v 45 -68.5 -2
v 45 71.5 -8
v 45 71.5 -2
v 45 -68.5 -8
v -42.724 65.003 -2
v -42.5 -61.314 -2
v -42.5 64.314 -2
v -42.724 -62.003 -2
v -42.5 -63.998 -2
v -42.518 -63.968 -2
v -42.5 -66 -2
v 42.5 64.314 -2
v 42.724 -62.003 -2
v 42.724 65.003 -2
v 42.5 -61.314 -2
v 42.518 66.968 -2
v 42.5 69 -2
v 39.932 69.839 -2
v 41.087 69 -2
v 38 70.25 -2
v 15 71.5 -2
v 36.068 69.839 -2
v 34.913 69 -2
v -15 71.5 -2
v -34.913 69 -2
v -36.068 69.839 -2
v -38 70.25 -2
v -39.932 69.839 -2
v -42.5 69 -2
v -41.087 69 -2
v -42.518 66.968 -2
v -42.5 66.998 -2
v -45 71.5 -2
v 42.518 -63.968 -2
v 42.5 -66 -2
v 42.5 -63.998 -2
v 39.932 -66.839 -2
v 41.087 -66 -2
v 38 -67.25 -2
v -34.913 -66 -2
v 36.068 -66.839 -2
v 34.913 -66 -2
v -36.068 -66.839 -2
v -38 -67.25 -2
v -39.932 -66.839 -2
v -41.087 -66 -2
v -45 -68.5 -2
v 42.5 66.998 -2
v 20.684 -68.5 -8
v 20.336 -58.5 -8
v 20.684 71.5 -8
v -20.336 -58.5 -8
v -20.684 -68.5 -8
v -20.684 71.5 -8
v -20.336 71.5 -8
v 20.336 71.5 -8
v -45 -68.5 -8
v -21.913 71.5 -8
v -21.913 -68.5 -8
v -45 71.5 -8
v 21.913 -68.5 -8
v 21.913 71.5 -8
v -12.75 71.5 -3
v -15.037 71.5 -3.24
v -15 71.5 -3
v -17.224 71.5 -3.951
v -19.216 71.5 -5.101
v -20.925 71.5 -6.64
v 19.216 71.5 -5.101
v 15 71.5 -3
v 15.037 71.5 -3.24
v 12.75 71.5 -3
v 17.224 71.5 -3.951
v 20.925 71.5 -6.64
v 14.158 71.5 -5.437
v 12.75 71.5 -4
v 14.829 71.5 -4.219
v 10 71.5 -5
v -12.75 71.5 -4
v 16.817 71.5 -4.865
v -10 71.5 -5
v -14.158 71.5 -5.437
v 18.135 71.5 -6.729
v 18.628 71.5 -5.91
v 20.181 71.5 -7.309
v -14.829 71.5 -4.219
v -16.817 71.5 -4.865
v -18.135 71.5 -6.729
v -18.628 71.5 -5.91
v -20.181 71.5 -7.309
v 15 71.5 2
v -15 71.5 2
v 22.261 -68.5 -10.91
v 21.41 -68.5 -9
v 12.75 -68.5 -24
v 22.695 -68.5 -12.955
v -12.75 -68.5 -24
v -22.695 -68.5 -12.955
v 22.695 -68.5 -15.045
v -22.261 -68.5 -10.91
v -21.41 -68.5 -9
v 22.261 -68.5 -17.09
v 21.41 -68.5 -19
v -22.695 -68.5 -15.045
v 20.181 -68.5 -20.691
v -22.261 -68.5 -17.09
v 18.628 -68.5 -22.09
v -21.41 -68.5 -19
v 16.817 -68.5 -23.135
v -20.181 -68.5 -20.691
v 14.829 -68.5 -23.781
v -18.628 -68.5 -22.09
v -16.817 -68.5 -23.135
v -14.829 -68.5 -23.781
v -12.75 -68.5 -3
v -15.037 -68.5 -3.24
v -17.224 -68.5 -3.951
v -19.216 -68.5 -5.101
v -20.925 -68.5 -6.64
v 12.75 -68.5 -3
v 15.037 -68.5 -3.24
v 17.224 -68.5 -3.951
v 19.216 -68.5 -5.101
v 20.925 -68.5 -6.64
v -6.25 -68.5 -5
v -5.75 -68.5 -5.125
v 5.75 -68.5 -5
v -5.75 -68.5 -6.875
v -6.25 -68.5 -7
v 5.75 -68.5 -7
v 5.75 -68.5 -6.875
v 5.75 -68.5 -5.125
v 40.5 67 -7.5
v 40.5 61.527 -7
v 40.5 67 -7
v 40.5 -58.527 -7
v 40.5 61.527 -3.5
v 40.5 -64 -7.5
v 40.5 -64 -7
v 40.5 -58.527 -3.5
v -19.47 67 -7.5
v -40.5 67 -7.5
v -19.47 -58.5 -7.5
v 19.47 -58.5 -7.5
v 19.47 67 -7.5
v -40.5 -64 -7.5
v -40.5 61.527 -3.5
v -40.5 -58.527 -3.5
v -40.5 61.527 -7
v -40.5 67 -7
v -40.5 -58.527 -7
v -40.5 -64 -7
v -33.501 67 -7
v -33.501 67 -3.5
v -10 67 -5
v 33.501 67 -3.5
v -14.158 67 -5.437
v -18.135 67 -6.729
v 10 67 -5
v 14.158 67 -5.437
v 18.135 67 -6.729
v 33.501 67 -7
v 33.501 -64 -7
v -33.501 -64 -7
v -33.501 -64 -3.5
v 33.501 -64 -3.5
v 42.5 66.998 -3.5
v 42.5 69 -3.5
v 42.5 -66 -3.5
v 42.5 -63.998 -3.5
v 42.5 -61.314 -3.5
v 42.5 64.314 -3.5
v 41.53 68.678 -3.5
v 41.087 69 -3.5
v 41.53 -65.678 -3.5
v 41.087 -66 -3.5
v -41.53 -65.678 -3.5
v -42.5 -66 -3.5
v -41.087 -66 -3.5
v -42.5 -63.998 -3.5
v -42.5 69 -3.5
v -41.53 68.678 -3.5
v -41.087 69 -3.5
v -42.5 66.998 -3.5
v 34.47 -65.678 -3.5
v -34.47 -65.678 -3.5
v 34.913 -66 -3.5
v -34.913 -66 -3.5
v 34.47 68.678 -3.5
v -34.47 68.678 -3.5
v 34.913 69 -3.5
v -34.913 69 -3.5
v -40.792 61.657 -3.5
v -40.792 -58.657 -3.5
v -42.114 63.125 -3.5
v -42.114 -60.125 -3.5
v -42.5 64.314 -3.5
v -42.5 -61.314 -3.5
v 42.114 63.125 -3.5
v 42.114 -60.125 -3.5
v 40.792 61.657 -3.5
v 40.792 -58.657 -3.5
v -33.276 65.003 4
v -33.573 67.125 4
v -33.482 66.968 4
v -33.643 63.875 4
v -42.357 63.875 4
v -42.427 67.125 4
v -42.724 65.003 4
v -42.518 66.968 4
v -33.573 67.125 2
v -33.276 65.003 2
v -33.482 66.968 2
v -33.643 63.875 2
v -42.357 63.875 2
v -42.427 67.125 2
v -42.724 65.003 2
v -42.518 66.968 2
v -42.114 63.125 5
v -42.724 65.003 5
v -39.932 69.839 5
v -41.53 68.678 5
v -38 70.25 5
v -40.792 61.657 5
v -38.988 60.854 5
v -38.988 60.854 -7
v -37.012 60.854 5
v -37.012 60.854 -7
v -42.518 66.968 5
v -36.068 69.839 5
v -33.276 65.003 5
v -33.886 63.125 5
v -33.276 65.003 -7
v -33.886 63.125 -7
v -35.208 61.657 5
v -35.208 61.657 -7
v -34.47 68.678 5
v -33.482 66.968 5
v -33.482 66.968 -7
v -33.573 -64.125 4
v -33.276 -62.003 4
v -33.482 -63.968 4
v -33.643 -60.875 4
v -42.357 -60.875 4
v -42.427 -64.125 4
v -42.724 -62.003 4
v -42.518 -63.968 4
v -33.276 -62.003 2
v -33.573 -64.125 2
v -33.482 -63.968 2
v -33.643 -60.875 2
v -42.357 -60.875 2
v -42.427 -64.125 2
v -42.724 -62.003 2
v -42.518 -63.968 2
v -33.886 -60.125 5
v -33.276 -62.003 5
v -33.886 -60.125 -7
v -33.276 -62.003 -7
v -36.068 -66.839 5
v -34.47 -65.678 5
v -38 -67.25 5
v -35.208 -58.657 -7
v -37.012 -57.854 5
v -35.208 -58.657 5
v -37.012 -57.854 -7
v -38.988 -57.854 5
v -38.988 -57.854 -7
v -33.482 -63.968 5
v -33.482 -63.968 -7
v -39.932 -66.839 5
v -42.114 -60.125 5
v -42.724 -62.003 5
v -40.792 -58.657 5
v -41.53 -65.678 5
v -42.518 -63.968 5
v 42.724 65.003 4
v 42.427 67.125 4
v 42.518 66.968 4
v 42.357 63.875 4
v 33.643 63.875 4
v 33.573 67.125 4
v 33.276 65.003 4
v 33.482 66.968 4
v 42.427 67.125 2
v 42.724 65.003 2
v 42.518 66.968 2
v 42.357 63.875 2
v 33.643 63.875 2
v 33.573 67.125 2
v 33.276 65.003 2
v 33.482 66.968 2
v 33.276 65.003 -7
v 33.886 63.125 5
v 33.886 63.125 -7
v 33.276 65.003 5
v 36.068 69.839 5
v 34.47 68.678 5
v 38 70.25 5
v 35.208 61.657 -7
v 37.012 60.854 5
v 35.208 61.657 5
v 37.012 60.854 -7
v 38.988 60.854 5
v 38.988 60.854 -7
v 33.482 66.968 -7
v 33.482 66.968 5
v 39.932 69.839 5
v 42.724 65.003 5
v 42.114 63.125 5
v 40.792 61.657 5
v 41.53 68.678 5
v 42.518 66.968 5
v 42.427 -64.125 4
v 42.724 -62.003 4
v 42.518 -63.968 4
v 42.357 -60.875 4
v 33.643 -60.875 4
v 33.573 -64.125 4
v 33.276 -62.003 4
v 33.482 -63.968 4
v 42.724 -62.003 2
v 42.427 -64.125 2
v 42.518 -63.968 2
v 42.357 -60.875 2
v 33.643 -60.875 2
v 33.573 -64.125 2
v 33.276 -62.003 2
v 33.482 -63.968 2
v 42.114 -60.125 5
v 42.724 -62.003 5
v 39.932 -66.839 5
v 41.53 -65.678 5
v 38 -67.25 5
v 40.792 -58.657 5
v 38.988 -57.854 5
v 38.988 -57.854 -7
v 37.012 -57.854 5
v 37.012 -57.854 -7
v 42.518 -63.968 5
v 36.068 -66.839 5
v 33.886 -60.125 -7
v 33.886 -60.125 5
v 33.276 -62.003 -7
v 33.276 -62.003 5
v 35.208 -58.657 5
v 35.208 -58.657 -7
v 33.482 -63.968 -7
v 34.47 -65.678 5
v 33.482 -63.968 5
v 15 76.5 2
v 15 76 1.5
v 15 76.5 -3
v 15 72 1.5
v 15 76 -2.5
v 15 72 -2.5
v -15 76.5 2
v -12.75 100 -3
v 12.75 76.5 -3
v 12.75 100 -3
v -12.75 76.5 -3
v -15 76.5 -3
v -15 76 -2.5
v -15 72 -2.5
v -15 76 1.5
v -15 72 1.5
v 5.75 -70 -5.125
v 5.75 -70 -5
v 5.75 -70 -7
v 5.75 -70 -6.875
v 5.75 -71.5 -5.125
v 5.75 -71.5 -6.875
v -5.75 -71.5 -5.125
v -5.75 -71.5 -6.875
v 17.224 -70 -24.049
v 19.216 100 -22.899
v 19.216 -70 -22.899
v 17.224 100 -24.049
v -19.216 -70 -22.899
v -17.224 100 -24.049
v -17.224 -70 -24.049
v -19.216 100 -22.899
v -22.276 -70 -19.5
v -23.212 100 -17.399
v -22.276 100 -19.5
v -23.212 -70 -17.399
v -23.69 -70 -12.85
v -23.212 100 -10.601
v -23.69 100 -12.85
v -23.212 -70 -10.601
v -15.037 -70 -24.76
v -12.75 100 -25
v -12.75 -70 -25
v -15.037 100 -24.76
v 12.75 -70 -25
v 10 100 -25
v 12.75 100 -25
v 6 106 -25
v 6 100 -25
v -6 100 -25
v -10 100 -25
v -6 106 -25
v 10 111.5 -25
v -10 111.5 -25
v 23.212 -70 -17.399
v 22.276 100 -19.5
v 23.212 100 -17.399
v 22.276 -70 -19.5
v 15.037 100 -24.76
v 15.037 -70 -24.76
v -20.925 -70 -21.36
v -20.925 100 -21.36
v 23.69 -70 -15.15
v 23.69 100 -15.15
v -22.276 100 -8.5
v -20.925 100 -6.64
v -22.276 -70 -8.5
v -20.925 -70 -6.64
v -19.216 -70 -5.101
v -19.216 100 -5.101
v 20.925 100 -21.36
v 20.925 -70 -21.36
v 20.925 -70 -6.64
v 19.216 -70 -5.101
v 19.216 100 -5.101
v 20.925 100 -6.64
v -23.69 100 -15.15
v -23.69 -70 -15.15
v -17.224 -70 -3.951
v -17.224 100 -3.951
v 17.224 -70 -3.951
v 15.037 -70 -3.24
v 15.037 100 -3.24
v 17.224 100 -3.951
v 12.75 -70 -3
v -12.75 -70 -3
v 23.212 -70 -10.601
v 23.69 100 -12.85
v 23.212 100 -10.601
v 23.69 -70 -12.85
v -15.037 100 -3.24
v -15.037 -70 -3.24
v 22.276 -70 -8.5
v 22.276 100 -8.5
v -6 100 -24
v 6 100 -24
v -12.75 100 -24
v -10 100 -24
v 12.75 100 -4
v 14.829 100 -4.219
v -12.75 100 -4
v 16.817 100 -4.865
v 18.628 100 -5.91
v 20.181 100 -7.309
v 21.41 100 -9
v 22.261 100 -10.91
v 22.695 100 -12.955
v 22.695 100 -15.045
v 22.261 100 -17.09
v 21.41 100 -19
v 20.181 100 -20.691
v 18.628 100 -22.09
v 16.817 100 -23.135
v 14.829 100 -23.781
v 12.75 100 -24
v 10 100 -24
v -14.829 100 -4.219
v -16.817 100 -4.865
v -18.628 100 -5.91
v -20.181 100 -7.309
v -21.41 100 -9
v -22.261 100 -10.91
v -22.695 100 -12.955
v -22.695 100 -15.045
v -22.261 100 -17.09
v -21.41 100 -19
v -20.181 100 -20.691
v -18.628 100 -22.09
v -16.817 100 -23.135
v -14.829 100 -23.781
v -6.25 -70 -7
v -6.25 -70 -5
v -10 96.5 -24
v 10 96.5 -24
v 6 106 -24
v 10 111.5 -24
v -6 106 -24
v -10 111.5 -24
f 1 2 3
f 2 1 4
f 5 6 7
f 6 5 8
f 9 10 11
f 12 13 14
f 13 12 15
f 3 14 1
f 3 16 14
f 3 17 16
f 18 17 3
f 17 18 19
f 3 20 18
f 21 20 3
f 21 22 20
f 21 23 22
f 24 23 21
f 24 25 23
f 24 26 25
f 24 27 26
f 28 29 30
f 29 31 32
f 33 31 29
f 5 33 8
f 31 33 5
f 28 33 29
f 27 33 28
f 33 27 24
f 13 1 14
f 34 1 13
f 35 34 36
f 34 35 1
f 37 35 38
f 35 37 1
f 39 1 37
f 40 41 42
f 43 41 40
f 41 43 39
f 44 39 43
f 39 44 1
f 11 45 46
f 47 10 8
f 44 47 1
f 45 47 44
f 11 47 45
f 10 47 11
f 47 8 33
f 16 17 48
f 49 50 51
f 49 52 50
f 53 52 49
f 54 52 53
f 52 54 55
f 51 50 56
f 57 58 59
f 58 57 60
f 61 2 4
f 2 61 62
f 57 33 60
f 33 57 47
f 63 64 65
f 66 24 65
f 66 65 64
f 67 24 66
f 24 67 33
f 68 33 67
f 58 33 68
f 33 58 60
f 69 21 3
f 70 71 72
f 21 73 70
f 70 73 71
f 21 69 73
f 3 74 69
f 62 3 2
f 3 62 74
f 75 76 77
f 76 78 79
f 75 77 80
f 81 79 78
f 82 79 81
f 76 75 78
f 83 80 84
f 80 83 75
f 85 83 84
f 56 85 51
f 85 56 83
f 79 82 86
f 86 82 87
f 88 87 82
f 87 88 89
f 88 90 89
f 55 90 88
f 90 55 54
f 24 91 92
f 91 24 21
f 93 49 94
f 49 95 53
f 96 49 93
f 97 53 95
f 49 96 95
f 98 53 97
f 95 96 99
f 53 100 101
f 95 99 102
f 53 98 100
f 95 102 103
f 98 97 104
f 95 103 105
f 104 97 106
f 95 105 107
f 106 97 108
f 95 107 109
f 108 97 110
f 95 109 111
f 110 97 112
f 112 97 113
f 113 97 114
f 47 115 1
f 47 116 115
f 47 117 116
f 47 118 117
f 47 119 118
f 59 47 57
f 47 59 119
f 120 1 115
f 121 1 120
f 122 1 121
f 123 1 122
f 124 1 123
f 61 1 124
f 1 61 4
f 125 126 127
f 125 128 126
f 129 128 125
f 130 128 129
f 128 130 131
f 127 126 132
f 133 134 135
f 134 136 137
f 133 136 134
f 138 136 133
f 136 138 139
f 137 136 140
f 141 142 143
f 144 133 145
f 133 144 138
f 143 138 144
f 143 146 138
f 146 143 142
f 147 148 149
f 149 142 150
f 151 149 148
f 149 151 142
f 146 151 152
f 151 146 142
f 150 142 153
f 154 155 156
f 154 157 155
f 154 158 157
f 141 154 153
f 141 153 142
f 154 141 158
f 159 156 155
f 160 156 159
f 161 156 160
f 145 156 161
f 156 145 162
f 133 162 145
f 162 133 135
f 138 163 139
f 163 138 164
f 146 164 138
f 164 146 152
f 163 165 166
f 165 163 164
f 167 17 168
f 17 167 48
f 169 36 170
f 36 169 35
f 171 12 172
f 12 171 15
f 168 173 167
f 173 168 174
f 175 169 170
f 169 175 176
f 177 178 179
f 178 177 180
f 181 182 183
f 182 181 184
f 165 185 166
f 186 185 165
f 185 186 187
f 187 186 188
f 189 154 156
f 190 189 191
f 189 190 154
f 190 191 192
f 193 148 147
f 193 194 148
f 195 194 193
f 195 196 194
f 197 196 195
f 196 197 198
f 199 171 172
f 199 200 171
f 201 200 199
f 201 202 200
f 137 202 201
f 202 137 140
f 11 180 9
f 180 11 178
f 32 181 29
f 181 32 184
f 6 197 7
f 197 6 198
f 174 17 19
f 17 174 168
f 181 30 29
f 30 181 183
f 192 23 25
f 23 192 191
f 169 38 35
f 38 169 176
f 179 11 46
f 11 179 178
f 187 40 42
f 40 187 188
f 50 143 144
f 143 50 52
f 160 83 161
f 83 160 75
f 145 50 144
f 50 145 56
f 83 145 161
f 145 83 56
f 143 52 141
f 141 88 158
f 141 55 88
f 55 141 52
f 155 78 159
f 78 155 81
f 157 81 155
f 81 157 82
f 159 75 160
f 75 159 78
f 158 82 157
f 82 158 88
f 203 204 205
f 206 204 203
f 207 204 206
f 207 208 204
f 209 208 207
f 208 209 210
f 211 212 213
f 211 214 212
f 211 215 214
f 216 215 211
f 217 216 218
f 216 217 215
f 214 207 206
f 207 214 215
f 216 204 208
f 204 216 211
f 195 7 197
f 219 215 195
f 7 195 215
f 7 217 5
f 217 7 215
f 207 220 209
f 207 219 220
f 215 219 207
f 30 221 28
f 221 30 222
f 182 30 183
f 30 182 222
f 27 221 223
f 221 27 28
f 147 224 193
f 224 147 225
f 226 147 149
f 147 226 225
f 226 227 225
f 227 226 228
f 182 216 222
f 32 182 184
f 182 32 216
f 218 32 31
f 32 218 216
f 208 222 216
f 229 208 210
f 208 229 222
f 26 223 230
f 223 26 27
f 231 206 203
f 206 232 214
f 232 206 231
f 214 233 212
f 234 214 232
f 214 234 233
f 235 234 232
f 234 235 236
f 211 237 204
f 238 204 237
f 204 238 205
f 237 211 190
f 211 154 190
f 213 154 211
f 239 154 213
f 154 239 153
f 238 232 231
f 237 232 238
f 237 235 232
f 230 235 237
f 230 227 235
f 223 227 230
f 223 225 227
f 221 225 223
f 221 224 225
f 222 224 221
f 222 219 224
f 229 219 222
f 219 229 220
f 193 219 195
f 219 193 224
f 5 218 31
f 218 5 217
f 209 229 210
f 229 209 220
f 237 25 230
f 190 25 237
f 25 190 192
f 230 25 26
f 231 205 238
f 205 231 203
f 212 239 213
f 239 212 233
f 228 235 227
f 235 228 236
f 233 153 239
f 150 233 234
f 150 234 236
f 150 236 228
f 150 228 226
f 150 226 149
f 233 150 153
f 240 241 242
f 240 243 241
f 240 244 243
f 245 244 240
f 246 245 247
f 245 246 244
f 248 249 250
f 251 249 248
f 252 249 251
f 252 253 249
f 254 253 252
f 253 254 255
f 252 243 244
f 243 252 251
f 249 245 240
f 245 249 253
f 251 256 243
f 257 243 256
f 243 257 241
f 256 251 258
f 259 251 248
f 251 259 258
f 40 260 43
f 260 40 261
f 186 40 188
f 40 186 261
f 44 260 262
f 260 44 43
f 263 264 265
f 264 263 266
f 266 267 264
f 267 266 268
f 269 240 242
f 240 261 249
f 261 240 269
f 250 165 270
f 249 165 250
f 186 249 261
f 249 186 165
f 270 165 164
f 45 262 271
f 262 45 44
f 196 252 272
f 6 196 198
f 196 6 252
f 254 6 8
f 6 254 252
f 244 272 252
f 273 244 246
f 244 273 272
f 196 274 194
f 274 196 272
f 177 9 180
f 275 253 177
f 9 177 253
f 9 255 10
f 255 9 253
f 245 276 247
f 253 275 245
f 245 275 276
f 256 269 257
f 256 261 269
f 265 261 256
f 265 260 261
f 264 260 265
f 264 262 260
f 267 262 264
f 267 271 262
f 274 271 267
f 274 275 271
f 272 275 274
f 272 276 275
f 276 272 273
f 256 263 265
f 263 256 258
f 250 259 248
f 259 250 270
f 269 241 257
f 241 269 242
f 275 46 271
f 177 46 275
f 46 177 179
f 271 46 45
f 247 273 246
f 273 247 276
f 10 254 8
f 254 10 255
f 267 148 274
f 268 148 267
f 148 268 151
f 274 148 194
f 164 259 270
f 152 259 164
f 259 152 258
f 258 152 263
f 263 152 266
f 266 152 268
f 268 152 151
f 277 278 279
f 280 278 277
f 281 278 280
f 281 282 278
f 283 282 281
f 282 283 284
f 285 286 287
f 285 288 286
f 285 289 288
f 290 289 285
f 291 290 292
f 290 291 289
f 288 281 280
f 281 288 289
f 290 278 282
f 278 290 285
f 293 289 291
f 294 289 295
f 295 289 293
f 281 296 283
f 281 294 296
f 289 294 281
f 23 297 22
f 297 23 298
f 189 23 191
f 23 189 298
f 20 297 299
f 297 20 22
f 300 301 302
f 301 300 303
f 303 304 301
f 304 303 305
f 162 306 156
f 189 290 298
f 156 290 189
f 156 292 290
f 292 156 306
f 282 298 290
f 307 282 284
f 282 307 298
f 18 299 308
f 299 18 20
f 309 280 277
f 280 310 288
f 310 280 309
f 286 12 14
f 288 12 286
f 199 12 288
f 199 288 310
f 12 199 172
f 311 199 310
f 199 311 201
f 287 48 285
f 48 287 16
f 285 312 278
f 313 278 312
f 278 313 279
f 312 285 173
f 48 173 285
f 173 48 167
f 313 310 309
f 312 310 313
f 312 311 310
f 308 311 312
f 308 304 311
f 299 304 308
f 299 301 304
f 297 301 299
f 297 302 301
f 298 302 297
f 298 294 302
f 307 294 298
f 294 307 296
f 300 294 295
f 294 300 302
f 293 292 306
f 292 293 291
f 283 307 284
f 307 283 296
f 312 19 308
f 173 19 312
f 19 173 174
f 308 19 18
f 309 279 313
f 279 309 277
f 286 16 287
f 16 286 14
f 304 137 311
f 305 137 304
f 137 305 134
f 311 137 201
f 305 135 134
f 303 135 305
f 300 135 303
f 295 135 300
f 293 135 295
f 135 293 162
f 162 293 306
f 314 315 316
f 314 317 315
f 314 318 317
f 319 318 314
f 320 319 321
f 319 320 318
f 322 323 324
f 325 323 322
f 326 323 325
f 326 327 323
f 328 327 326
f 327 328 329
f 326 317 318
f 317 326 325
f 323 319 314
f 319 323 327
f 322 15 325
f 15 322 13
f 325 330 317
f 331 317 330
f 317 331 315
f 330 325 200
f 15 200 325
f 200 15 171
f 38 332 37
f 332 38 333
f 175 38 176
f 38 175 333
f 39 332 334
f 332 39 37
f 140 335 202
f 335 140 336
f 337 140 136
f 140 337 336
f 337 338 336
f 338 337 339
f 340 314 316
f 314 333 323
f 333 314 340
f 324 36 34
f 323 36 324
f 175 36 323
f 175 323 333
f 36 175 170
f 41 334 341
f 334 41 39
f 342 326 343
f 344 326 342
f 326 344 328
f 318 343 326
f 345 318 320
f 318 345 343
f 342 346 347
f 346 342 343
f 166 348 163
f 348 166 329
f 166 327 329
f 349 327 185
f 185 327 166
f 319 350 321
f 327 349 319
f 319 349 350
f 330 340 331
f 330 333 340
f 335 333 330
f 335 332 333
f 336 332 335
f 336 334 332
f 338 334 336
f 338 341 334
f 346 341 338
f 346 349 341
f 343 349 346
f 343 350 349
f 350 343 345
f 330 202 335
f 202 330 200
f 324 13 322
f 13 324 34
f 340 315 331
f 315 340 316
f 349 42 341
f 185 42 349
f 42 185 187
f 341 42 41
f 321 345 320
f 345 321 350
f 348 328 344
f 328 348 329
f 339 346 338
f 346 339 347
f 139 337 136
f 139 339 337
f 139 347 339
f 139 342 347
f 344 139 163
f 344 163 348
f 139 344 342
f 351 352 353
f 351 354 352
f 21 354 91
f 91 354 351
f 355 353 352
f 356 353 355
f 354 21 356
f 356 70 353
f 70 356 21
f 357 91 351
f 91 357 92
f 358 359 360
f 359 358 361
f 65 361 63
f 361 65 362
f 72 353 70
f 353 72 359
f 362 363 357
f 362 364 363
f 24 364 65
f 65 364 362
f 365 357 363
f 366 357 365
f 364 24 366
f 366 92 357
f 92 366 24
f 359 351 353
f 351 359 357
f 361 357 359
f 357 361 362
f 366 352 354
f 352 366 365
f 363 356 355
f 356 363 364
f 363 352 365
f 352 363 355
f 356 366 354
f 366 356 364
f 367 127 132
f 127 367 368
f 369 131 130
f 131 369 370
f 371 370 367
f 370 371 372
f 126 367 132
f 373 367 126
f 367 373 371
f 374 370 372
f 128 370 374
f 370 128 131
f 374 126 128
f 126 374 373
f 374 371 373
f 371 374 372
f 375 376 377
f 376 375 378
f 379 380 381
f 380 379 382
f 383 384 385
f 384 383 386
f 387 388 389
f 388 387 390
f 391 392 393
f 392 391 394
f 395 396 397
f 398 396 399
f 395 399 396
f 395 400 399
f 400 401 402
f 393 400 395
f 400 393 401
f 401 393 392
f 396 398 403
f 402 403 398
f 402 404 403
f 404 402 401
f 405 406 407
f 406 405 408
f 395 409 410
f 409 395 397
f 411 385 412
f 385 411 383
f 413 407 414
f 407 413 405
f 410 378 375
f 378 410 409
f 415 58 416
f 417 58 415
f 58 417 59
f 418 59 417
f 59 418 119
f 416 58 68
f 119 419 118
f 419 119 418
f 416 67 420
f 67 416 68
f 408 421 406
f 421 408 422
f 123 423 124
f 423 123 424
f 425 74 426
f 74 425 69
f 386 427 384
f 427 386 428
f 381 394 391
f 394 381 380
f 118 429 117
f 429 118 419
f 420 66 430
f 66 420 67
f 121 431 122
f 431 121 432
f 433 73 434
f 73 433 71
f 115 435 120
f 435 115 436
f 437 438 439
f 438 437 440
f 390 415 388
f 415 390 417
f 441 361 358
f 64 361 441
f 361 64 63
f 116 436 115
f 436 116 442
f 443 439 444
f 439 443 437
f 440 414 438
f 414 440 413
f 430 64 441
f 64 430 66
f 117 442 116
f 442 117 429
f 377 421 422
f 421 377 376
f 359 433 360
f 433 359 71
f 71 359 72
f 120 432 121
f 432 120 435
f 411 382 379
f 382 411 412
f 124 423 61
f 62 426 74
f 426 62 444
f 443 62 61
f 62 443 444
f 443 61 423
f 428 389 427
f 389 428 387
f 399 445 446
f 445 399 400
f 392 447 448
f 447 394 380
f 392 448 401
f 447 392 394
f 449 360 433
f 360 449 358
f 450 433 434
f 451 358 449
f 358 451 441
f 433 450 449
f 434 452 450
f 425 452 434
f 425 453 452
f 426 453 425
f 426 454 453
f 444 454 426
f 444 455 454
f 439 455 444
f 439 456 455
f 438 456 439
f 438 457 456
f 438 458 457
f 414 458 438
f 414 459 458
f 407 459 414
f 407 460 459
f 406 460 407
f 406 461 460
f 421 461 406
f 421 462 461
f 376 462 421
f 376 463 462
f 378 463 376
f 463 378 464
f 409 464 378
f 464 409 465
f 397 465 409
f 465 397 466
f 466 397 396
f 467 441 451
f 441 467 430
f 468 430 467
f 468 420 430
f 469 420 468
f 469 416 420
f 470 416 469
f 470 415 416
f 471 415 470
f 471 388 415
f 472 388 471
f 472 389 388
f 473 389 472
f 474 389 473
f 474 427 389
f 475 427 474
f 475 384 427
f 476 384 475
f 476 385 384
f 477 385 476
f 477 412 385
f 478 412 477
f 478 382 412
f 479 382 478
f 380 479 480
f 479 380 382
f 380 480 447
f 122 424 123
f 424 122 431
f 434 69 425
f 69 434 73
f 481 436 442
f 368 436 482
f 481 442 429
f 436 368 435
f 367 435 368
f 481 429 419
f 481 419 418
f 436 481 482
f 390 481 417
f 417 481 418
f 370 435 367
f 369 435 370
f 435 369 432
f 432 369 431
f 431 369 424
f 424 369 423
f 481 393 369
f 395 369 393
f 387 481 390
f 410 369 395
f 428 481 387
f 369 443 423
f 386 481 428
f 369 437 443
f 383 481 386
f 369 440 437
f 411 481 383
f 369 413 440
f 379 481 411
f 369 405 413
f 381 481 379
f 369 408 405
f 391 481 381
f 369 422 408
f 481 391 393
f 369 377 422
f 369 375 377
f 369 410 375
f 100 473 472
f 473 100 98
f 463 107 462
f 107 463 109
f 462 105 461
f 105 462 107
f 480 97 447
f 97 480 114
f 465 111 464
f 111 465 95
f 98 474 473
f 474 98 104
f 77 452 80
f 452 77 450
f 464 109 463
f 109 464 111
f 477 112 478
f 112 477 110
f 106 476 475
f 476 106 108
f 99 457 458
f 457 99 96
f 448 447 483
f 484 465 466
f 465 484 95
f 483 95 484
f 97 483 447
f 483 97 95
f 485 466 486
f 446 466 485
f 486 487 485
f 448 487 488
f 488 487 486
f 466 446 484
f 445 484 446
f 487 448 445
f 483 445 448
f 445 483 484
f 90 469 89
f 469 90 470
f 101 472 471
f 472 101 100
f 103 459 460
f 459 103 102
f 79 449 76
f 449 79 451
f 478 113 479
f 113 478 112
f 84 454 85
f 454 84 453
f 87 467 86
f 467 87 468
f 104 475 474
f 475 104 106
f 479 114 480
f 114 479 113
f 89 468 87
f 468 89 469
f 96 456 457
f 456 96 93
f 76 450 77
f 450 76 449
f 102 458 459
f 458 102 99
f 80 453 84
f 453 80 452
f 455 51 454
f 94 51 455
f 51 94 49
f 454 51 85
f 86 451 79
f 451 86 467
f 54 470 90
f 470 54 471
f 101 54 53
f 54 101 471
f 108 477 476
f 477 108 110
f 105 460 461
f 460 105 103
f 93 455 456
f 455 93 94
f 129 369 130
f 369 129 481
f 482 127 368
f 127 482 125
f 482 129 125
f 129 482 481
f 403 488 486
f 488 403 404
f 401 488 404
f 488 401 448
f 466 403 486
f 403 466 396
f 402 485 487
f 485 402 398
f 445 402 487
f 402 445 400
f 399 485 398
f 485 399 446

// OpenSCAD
// file: scad-parts/filter-side-clamps.scad
/////////////////////////////////////////////////////////////////////////////////
// This module is for generating the side holder clips for the filter holders. //
// The clips will help form a better seal around the filters.                  //
/////////////////////////////////////////////////////////////////////////////////

module filter_side_clamps(){
    difference() {
        translate([0,0,-4])
        cube([18,5,13],center=true);
        translate([0,1,-4.5])
        cube([30,4,9],center=true);
        translate([0,0,-4])
        cube([30,3,10],center=true);
    }
}

filter_side_clamps();
// file: scad-parts/front-plug.scad
$fn=360;

module front_face_plug() {
    difference(){
        cylinder(h=3, r=20, center=true);
        translate([0,0,1])
        cylinder(h=3, r=19.5, center=true);
    }

    translate([0,0,5])
    cylinder(h=10, r=1, center=true);

    translate([0,0,10.5])
    cylinder(h=2, r1=1.5, r2=0, center=true);
}

front_face_plug();
// file: scad-parts/universal-filter-holder-top.scad
/////////////////////////////////////////////////////////////////
// This module is used for maintaining the PM2.5 Filter holder.//
/////////////////////////////////////////////////////////////////

// This imports the peg hole's to make the cutouts in the filter holder.
use <connector-pegs.scad>

module universal_filter_holder(filter_holder_x, filter_holder_y, filter_holder_z, filter_hole_height,filter_hole_radius, filter_hole_length, peg_space, peg_y_position, number_of_pegs, peg_height, peg_radius,connector_clip_x, connector_clip_y, connector_clip_z) {
    
    difference() {
        
        // This section is for creating the base rectangle for the filter holder.
        union() {
            // This section is for creating the YELLOW rectangle pieces of the filter holder.
            color("yellow")
            cube([filter_holder_x, filter_holder_y, filter_holder_z], center=true);
            
            // This section is for creating the RED rectangle pieces of the filter holder.
            translate([0,0,-1])
            color("red")
            cube([90-5.25, 124.5, filter_holder_z], center=true);
            
        }
    

        //This Section is for maintaining the large PINK center cutout for the air to pass through.
        translate([0, -filter_hole_length/2, 0])
        color("pink")
        hull() {
            translate([0, filter_hole_length, 0]) 
            cylinder(h = filter_hole_height, r1 = filter_hole_radius, r2 = filter_hole_radius, center = true);
            
            translate([0,0,-1])
            cylinder(h = filter_hole_height, r1 = filter_hole_radius, r2 = filter_hole_radius, center = true);
        }
        
        // This section is for making the PURPLE gap for holding the filter.
         translate([0,0,1])
         color("purple")
         cube([filter_holder_x-5, filter_holder_y-15, filter_holder_z+1], center=true);
    
        // This section is for cutting out the BLUE peg holes. Color defined in connector_pegs.scad file.
        // use <connector-pegs.scad>
        rotate([0,0,90])
        translate([0,peg_y_position,0])
        holder_pegs(peg_space, number_of_pegs, peg_height, peg_radius, connector_clip_x, connector_clip_y, connector_clip_z);

        rotate([0,0,90])
        translate([0,-peg_y_position,0])
    holder_pegs(peg_space, number_of_pegs, peg_height, peg_radius, connector_clip_x, connector_clip_y, connector_clip_z);
        
        }
    // The following 3 section create crossbar holders for the filters to secure them.    
    translate([0, -filter_hole_length/2, -1.75])  
    cube([filter_holder_x-5.25, 4, 1.5], center=true);
        
    translate([0, filter_hole_length/2, -1.75])  
    cube([filter_holder_x-5.25, 4, 1.5], center=true);
             
    translate([0, 0, -1.75])  
    cube([4, filter_holder_y-15.5, 1.5], center=true);

}

// Bottom Layer top
universal_filter_holder(filter_holder_x=90,
              filter_holder_y=140,
              filter_holder_z=3,
              filter_hole_height = 6,
              filter_hole_radius = 34,
              filter_hole_length = 48,
              peg_y_position=38,
              peg_space=64,
              number_of_pegs=2,
              peg_height=10,
              peg_radius=5,
              connector_clip_x=10,
              connector_clip_y=3,
              connector_clip_z=2);
// file: scad-parts/connector-blocks.scad
//////////////////////////////////////////////////////////////////////////////////////////////
// This module is used for connecting the snorkel to the filter.//
//////////////////////////////////////////////////////////////////////////////////////////////

// Generates two BLUEoutside blocks for the plug to connect through.
module connector_block_cutout(ccube_x, ccube_y, ccube_z){
    color("blue")
    difference() {
        cube([ccube_x, ccube_y, ccube_z],center=true);
        cube([ccube_x+2, ccube_y-1, ccube_z-1],center=true);
    }
}

// Generates RED inside block for the plug to connect through.
module connector_block_outsides(ccube_x, ccube_y, ccube_z){
    color("red")
    difference() {
        connector_block_cutout(ccube_x, ccube_y, ccube_z);
        cube([ccube_x-15, ccube_y+2, ccube_z+2],center=true);
    }
}

// Generates the white plug to hold the parts together.
module connector_block_peg(ccube_x, ccube_y, ccube_z){
    color("white")
    difference() {
        cube([ccube_x+2, ccube_y, ccube_z],center=true);
        translate([-1, 0, 0])
        connector_block_cutout(ccube_x+.25, ccube_y+.25, ccube_z+.25);
    }
}

// Generates two BLUEoutside blocks for the plug to connect through.
connector_block_outsides(ccube_x=30, ccube_y=5, ccube_z=5);

// Generates RED inside block for the plug to connect through.
connector_block_cutout(ccube_x=15, ccube_y=5, ccube_z=5);

// Generates the white plug to hold the parts together.
//connector_block_peg(ccube_x=30, ccube_y=5, ccube_z=5);
// file: scad-parts/connector-pegs.scad
//////////////////////////////////////////////////////////////////
// This module is used for generating the peg cutouts and pegs. //
//////////////////////////////////////////////////////////////////

// peg_space: This controls the X-axis space between the pegs.
// number_of_pegs: This defines the number of pegs to generate.
// peg_height: This defines the Z-axis height of the peg.
// peg_radius: This determines the diameter/circumferance of each peg.
// peg_y_position: This determines the Y-axis position of the pegs.

// This generates the GREEN peg clip.
module peg_connector_clip(connector_clip_x, connector_clip_y, connector_clip_z) {
    color("green")
    cube([connector_clip_x, connector_clip_y, connector_clip_z],true);
    translate([connector_clip_y+2,0,.25])
    cube([2,5,2.5],true);
}

// This generates the WHITE hole size in the Blue peg so the GREEN clip can slide in.
module peg_connector_hole(connector_clip_x, connector_clip_y, connector_clip_z) {
    color("white")
    peg_connector_clip(connector_clip_x+.25, connector_clip_y+.25, connector_clip_z);
}

// This module combines and diffs the WHITE hole from the BLUE peg.
module peg(peg_height, peg_radius, connector_clip_x, connector_clip_y, connector_clip_z) {
    difference() {
        // This generates the BLUE peg.
        color("blue")
        cylinder(h = peg_height, r1 = peg_radius, r2 = peg_radius, center = true);
        
        // This is the WHITE peg Hole.
        rotate([0,0,90])
        translate([2, 0, +4])
        peg_connector_hole(connector_clip_x, connector_clip_y, connector_clip_z);
    }
}

// This module generates "number_of_pegs" at "pegs_space" in millimeters apart.
module holder_pegs(peg_space, number_of_pegs, peg_height, peg_radius, connector_clip_x, connector_clip_y, connector_clip_z) {
    for (i=[0: 360/number_of_pegs: 360])
        rotate([0,0,i])
        translate([peg_space,0,0])
        peg(peg_height, peg_radius, connector_clip_x, connector_clip_y, connector_clip_z);
}


peg_y_position=20;

translate([0,peg_y_position,0])
holder_pegs(peg_space=60,
            number_of_pegs=2,
            peg_height=12,
            peg_radius=5,
            connector_clip_x=13,
            connector_clip_y=3,
            connector_clip_z=2);

//translate([0,-peg_y_position,0])
//holder_pegs(peg_space=60,
//            number_of_pegs=2,
//            peg_height=12,
//            peg_radius=5,
//            connector_clip_x=10,
//            connector_clip_y=3,
//            connector_clip_z=2);

//peg_connector_clip(connector_clip_x=10,
//                   connector_clip_y=3,
//                   connector_clip_z=2);
// file: scad-parts/filter-holder-bottom.scad
/////////////////////////////////////////////////////////////////////////////////////////
// This module is used for creating the box for the snorkel tube and filter to connect.//
/////////////////////////////////////////////////////////////////////////////////////////

// This imports the peg hole's to make the cutouts in the filter holder.
use <connector-pegs.scad>
// This imports the peg hole's to make the cutouts in the filter holder.
use <snorkel-tube-attachment.scad>
// This imports the connector blocks, designed to connect the snorkel to the filter bottom.
use <connector-blocks.scad>

//Bottom half of the air filter holder.
module filter_holder_bottom(filter_holder_top_x, filter_holder_top_y, filter_holder_top_z, snorkel_tube_height, snorkel_tube_radius, snorkel_diameter, peg_space, number_of_pegs, peg_height, peg_radius, peg_y_position, connector_clip_x, connector_clip_y, connector_clip_z) {
    
    
    difference() {
        // This is the YELLOW base plate that everything is carving out of.
        color("yellow")
        cube([filter_holder_top_x, filter_holder_top_y, filter_holder_top_z], center=true);
        
        // This is the initial ORANGE area carved out of the inside of the YELLOW section.
        color("orange")
        cube([filter_holder_top_x-9, filter_holder_top_y-9, filter_holder_top_z-1], center=true);
        
        // This is the GREEN edge so that the filter layer connects nicely to this piece.
        color("green")
        translate([0,0,filter_holder_top_z-1])
        cube([filter_holder_top_x-5, filter_holder_top_y-5, filter_holder_top_z+1], center=true);
        
        // This is the PINK cutout so that the snorkel attachment can connect to the YELLOW base layer.
        // use <snorkel-tube-attachment.scad>
        color("pink")
        rotate([90,90,0])
        translate([20, -10, -15])
        snorkel_tube_outer_wall(snorkel_diameter=20, snorkel_tube_height=150, snorkel_tube_radius=20);
    }
    
    // This section is for generating the BLUE pegs. Color defined in connector_pegs.scad file.
    // use <connector-pegs.scad>
    rotate([0,0,90])
    translate([0,peg_y_position,peg_height/3])
    holder_pegs(peg_space, number_of_pegs, peg_height, peg_radius-.25, connector_clip_x, connector_clip_y, connector_clip_z);

    rotate([0,0,90])
    translate([0,-peg_y_position,peg_height/3])
    holder_pegs(peg_space, number_of_pegs, peg_height, peg_radius-.25, connector_clip_x, connector_clip_y, connector_clip_z);
    
    // This section is for adding the BLACK connector blocks used to secure YELLOW to snorkel tube.
    // use <connector-blocks.scad> 
    color("black")
    translate([0,72.5,4.5])
    connector_block_outsides(ccube_x=30, ccube_y=5, ccube_z=5);
    
    
    // This section is for adding the PURPLE connector peg at the back of the YELLOW layer.
    color("purple")
    translate([0, -70, -1])
    cube([11.5,6,1.75], center=true);

}

filter_holder_bottom(filter_holder_top_x=90,
                     filter_holder_top_y=140,
                     filter_holder_top_z=6,
                     snorkel_diameter=20,
                     snorkel_tube_height=5,
                     snorkel_tube_radius=10,
                     peg_y_position=38,
                     peg_space=64,
                     number_of_pegs=2,
                     peg_height=13,
                     peg_radius=5,
                     connector_clip_x=10,
                     connector_clip_y=3,
                     connector_clip_z=2);
// file: scad-parts/snorkel-tube-attachment.scad
//////////////////////////////////////////////////////////////////////////////////////////////
// This module is used for maintaining the connector tube to the PM2.5 Filter holder bottom.//
//////////////////////////////////////////////////////////////////////////////////////////////

// This imports the connector blocks, designed to connect the snorkel to the filter bottom.
use <connector-blocks.scad>


// This module is for generating the outer tube wall.
module snorkel_tube_outer_wall(snorkel_diameter, snorkel_tube_height, snorkel_tube_radius){
    hull() {
        translate([0, snorkel_diameter, 0]) 
        cylinder(h = snorkel_tube_height, r1 = snorkel_tube_radius, r2 = snorkel_tube_radius, center = true);
        cylinder(h = snorkel_tube_height, r1 = snorkel_tube_radius, r2 = snorkel_tube_radius, center = true);
        }
}

// This module is for removing the center of the tube.
module snorkel_tube_inner_cutout(snorkel_diameter, snorkel_tube_height, snorkel_tube_radius){
    translate([0, 0, -1])
    hull() {
        translate([0, snorkel_diameter, 0]) 
        cylinder(h = snorkel_tube_height-1, r1 = snorkel_tube_radius-1, r2 = snorkel_tube_radius-1, center = true);
        cylinder(h = snorkel_tube_height-1, r1 = snorkel_tube_radius-1, r2 = snorkel_tube_radius-1, center = true);
    }
}


// This module combines the first two modules to diff the inner out of the outer wall.
module diffed_snorkel_tube(snorkel_diameter, snorkel_tube_height, snorkel_tube_radius){
    
    translate([0, -(snorkel_diameter/2), 0])
    difference(){
    snorkel_tube_outer_wall(snorkel_diameter, snorkel_tube_height, snorkel_tube_radius);
    snorkel_tube_inner_cutout(snorkel_diameter, snorkel_tube_height, snorkel_tube_radius);
    
    color("red")
    translate([-11, 0, 13.5])
    cube([10,90,140],center=true);

    // Snorkel tube backside cutout.
    color("purple")
    translate([-8, 12.5, 84])
    cube([2,12,6], center=true);   

    }
   
}

// This module is for generating connector clip to connect the tube to the mask.
module connector_clip(){
    difference(){
        cube([15,20,1],center=true);
        translate([-1,0,0])
        cube([6,12,10],center=true);      
    }
}

module snorkel_filter_attachment_tube(snorkel_diameter, snorkel_tube_height, snorkel_tube_radius){
    rotate([90,90,0])
    translate([9, 0, -15])   
    diffed_snorkel_tube(snorkel_diameter, snorkel_tube_height, snorkel_tube_radius);   
    
    // This adds the black connector section on the front to connect the filter bottom to the snorkel tube.
    //use <connector-blocks.scad>
    color("black")
    translate([0,74,4.5])
    connector_block_cutout(ccube_x=15, ccube_y=5, ccube_z=5);
    
    color("green")
    rotate([0,0,90])
    translate([104,0, -19.5])
    connector_clip();
  
}

snorkel_filter_attachment_tube(snorkel_diameter=25.5, snorkel_tube_height=170, snorkel_tube_radius=11);
// main file
/////////////////////////////////////////////////////////////////////////
// The universal mask is made with a filter holder specifically        //
// designed to have a smaller opening to hold partial piece of a mask. //
// This should only be used in times of emergency when supplies are    //
// critically low.                                                     //
/////////////////////////////////////////////////////////////////////////


use <scad-parts/snorkel-tube-attachment.scad>
use <scad-parts/filter-holder-bottom.scad>
use <scad-parts/connector-pegs.scad>
use <scad-parts/connector-blocks.scad>
use <scad-parts/universal-filter-holder-top.scad>
use <scad-parts/front-plug.scad>
use <scad-parts/filter-side-clamps.scad>

/////////////////////////////////////////////////////
// Filter layer bottom.                            //
//use <scad-parts/filter-holder-bottom.scad>       //
/////////////////////////////////////////////////////
translate([0,1.5,-5])
filter_holder_bottom(filter_holder_top_x=90,
                     filter_holder_top_y=140,
                     filter_holder_top_z=6,
                     snorkel_diameter=25.5,
                     snorkel_tube_height=5,
                     snorkel_tube_radius=11,
                     peg_y_position=38,
                     peg_space=64,
                     number_of_pegs=2,
                     peg_height=12,
                     peg_radius=5,
                     connector_clip_x=16,
                     connector_clip_y=3,
                     connector_clip_z=2);

///////////////////////////////////////////////////////
// Universal first filter holder layer.              //
//use <scad-parts/universal-filter-holder-top.scad>  //
///////////////////////////////////////////////////////
//color("green")
//translate([0,11.50,-1])
//universal_filter_holder(filter_holder_x=90,
//              filter_holder_y=140,
//              filter_holder_z=2,
//              filter_hole_height = 6,
//              filter_hole_radius = 30,
//              filter_hole_length = 45,
//              peg_y_position=38,
//              peg_space=64,
//              number_of_pegs=2,
//              peg_height=10,
//              peg_radius=5,
//              connector_clip_x=10,
//              connector_clip_y=3,
//              connector_clip_z=2);

//////////////////////////////////////////////////////
// Universal second filter holder layer.            //
//use <scad-parts/universal-filter-holder-top.scad> //
//////////////////////////////////////////////////////
//color("red")
//translate([0,11.50,1])
//universal_filter_holder(filter_holder_x=90,
//              filter_holder_y=140,
//              filter_holder_z=2,
//              filter_hole_height = 6,
//              filter_hole_radius = 30,
//              filter_hole_length = 45,
//              peg_y_position=38,
//              peg_space=64,
//              number_of_pegs=2,
//              peg_height=10,
//              peg_radius=5,
//              connector_clip_x=10,
//              connector_clip_y=3,
//              connector_clip_z=2);

//////////////////////////////////////////////////
// Connector tube to snorkel mask.              //
//use <scad-parts/snorkel-tube-attachment.scad> //
//////////////////////////////////////////////////
rotate([0,0,0])
translate([0, 0, -5])
snorkel_filter_attachment_tube(snorkel_diameter=25.5, snorkel_tube_height=170, snorkel_tube_radius=11);

///////////////////////////////////////////
// Clips for four filter holder pegs.    //
// use <scad-parts/connector_pegs.scad>  //
///////////////////////////////////////////
//peg_connector_clip(connector_clip_x=10,
//                   connector_clip_y=2.5,
//                   connector_clip_z=1.5);

///////////////////////////////////////////
// Peg for front holder squares.         //
//use <scad-parts/connector_blocks.scad> //
///////////////////////////////////////////
//connector_block_peg(ccube_x=30, 
//                     ccube_y=4,
//                     ccube_z=4);

///////////////////////////////////////////////
// Side clamps for preventing side buldging. //
//use <scad-parts/filter-side-clamps.scad>   //
///////////////////////////////////////////////
//filter_side_clamps();
